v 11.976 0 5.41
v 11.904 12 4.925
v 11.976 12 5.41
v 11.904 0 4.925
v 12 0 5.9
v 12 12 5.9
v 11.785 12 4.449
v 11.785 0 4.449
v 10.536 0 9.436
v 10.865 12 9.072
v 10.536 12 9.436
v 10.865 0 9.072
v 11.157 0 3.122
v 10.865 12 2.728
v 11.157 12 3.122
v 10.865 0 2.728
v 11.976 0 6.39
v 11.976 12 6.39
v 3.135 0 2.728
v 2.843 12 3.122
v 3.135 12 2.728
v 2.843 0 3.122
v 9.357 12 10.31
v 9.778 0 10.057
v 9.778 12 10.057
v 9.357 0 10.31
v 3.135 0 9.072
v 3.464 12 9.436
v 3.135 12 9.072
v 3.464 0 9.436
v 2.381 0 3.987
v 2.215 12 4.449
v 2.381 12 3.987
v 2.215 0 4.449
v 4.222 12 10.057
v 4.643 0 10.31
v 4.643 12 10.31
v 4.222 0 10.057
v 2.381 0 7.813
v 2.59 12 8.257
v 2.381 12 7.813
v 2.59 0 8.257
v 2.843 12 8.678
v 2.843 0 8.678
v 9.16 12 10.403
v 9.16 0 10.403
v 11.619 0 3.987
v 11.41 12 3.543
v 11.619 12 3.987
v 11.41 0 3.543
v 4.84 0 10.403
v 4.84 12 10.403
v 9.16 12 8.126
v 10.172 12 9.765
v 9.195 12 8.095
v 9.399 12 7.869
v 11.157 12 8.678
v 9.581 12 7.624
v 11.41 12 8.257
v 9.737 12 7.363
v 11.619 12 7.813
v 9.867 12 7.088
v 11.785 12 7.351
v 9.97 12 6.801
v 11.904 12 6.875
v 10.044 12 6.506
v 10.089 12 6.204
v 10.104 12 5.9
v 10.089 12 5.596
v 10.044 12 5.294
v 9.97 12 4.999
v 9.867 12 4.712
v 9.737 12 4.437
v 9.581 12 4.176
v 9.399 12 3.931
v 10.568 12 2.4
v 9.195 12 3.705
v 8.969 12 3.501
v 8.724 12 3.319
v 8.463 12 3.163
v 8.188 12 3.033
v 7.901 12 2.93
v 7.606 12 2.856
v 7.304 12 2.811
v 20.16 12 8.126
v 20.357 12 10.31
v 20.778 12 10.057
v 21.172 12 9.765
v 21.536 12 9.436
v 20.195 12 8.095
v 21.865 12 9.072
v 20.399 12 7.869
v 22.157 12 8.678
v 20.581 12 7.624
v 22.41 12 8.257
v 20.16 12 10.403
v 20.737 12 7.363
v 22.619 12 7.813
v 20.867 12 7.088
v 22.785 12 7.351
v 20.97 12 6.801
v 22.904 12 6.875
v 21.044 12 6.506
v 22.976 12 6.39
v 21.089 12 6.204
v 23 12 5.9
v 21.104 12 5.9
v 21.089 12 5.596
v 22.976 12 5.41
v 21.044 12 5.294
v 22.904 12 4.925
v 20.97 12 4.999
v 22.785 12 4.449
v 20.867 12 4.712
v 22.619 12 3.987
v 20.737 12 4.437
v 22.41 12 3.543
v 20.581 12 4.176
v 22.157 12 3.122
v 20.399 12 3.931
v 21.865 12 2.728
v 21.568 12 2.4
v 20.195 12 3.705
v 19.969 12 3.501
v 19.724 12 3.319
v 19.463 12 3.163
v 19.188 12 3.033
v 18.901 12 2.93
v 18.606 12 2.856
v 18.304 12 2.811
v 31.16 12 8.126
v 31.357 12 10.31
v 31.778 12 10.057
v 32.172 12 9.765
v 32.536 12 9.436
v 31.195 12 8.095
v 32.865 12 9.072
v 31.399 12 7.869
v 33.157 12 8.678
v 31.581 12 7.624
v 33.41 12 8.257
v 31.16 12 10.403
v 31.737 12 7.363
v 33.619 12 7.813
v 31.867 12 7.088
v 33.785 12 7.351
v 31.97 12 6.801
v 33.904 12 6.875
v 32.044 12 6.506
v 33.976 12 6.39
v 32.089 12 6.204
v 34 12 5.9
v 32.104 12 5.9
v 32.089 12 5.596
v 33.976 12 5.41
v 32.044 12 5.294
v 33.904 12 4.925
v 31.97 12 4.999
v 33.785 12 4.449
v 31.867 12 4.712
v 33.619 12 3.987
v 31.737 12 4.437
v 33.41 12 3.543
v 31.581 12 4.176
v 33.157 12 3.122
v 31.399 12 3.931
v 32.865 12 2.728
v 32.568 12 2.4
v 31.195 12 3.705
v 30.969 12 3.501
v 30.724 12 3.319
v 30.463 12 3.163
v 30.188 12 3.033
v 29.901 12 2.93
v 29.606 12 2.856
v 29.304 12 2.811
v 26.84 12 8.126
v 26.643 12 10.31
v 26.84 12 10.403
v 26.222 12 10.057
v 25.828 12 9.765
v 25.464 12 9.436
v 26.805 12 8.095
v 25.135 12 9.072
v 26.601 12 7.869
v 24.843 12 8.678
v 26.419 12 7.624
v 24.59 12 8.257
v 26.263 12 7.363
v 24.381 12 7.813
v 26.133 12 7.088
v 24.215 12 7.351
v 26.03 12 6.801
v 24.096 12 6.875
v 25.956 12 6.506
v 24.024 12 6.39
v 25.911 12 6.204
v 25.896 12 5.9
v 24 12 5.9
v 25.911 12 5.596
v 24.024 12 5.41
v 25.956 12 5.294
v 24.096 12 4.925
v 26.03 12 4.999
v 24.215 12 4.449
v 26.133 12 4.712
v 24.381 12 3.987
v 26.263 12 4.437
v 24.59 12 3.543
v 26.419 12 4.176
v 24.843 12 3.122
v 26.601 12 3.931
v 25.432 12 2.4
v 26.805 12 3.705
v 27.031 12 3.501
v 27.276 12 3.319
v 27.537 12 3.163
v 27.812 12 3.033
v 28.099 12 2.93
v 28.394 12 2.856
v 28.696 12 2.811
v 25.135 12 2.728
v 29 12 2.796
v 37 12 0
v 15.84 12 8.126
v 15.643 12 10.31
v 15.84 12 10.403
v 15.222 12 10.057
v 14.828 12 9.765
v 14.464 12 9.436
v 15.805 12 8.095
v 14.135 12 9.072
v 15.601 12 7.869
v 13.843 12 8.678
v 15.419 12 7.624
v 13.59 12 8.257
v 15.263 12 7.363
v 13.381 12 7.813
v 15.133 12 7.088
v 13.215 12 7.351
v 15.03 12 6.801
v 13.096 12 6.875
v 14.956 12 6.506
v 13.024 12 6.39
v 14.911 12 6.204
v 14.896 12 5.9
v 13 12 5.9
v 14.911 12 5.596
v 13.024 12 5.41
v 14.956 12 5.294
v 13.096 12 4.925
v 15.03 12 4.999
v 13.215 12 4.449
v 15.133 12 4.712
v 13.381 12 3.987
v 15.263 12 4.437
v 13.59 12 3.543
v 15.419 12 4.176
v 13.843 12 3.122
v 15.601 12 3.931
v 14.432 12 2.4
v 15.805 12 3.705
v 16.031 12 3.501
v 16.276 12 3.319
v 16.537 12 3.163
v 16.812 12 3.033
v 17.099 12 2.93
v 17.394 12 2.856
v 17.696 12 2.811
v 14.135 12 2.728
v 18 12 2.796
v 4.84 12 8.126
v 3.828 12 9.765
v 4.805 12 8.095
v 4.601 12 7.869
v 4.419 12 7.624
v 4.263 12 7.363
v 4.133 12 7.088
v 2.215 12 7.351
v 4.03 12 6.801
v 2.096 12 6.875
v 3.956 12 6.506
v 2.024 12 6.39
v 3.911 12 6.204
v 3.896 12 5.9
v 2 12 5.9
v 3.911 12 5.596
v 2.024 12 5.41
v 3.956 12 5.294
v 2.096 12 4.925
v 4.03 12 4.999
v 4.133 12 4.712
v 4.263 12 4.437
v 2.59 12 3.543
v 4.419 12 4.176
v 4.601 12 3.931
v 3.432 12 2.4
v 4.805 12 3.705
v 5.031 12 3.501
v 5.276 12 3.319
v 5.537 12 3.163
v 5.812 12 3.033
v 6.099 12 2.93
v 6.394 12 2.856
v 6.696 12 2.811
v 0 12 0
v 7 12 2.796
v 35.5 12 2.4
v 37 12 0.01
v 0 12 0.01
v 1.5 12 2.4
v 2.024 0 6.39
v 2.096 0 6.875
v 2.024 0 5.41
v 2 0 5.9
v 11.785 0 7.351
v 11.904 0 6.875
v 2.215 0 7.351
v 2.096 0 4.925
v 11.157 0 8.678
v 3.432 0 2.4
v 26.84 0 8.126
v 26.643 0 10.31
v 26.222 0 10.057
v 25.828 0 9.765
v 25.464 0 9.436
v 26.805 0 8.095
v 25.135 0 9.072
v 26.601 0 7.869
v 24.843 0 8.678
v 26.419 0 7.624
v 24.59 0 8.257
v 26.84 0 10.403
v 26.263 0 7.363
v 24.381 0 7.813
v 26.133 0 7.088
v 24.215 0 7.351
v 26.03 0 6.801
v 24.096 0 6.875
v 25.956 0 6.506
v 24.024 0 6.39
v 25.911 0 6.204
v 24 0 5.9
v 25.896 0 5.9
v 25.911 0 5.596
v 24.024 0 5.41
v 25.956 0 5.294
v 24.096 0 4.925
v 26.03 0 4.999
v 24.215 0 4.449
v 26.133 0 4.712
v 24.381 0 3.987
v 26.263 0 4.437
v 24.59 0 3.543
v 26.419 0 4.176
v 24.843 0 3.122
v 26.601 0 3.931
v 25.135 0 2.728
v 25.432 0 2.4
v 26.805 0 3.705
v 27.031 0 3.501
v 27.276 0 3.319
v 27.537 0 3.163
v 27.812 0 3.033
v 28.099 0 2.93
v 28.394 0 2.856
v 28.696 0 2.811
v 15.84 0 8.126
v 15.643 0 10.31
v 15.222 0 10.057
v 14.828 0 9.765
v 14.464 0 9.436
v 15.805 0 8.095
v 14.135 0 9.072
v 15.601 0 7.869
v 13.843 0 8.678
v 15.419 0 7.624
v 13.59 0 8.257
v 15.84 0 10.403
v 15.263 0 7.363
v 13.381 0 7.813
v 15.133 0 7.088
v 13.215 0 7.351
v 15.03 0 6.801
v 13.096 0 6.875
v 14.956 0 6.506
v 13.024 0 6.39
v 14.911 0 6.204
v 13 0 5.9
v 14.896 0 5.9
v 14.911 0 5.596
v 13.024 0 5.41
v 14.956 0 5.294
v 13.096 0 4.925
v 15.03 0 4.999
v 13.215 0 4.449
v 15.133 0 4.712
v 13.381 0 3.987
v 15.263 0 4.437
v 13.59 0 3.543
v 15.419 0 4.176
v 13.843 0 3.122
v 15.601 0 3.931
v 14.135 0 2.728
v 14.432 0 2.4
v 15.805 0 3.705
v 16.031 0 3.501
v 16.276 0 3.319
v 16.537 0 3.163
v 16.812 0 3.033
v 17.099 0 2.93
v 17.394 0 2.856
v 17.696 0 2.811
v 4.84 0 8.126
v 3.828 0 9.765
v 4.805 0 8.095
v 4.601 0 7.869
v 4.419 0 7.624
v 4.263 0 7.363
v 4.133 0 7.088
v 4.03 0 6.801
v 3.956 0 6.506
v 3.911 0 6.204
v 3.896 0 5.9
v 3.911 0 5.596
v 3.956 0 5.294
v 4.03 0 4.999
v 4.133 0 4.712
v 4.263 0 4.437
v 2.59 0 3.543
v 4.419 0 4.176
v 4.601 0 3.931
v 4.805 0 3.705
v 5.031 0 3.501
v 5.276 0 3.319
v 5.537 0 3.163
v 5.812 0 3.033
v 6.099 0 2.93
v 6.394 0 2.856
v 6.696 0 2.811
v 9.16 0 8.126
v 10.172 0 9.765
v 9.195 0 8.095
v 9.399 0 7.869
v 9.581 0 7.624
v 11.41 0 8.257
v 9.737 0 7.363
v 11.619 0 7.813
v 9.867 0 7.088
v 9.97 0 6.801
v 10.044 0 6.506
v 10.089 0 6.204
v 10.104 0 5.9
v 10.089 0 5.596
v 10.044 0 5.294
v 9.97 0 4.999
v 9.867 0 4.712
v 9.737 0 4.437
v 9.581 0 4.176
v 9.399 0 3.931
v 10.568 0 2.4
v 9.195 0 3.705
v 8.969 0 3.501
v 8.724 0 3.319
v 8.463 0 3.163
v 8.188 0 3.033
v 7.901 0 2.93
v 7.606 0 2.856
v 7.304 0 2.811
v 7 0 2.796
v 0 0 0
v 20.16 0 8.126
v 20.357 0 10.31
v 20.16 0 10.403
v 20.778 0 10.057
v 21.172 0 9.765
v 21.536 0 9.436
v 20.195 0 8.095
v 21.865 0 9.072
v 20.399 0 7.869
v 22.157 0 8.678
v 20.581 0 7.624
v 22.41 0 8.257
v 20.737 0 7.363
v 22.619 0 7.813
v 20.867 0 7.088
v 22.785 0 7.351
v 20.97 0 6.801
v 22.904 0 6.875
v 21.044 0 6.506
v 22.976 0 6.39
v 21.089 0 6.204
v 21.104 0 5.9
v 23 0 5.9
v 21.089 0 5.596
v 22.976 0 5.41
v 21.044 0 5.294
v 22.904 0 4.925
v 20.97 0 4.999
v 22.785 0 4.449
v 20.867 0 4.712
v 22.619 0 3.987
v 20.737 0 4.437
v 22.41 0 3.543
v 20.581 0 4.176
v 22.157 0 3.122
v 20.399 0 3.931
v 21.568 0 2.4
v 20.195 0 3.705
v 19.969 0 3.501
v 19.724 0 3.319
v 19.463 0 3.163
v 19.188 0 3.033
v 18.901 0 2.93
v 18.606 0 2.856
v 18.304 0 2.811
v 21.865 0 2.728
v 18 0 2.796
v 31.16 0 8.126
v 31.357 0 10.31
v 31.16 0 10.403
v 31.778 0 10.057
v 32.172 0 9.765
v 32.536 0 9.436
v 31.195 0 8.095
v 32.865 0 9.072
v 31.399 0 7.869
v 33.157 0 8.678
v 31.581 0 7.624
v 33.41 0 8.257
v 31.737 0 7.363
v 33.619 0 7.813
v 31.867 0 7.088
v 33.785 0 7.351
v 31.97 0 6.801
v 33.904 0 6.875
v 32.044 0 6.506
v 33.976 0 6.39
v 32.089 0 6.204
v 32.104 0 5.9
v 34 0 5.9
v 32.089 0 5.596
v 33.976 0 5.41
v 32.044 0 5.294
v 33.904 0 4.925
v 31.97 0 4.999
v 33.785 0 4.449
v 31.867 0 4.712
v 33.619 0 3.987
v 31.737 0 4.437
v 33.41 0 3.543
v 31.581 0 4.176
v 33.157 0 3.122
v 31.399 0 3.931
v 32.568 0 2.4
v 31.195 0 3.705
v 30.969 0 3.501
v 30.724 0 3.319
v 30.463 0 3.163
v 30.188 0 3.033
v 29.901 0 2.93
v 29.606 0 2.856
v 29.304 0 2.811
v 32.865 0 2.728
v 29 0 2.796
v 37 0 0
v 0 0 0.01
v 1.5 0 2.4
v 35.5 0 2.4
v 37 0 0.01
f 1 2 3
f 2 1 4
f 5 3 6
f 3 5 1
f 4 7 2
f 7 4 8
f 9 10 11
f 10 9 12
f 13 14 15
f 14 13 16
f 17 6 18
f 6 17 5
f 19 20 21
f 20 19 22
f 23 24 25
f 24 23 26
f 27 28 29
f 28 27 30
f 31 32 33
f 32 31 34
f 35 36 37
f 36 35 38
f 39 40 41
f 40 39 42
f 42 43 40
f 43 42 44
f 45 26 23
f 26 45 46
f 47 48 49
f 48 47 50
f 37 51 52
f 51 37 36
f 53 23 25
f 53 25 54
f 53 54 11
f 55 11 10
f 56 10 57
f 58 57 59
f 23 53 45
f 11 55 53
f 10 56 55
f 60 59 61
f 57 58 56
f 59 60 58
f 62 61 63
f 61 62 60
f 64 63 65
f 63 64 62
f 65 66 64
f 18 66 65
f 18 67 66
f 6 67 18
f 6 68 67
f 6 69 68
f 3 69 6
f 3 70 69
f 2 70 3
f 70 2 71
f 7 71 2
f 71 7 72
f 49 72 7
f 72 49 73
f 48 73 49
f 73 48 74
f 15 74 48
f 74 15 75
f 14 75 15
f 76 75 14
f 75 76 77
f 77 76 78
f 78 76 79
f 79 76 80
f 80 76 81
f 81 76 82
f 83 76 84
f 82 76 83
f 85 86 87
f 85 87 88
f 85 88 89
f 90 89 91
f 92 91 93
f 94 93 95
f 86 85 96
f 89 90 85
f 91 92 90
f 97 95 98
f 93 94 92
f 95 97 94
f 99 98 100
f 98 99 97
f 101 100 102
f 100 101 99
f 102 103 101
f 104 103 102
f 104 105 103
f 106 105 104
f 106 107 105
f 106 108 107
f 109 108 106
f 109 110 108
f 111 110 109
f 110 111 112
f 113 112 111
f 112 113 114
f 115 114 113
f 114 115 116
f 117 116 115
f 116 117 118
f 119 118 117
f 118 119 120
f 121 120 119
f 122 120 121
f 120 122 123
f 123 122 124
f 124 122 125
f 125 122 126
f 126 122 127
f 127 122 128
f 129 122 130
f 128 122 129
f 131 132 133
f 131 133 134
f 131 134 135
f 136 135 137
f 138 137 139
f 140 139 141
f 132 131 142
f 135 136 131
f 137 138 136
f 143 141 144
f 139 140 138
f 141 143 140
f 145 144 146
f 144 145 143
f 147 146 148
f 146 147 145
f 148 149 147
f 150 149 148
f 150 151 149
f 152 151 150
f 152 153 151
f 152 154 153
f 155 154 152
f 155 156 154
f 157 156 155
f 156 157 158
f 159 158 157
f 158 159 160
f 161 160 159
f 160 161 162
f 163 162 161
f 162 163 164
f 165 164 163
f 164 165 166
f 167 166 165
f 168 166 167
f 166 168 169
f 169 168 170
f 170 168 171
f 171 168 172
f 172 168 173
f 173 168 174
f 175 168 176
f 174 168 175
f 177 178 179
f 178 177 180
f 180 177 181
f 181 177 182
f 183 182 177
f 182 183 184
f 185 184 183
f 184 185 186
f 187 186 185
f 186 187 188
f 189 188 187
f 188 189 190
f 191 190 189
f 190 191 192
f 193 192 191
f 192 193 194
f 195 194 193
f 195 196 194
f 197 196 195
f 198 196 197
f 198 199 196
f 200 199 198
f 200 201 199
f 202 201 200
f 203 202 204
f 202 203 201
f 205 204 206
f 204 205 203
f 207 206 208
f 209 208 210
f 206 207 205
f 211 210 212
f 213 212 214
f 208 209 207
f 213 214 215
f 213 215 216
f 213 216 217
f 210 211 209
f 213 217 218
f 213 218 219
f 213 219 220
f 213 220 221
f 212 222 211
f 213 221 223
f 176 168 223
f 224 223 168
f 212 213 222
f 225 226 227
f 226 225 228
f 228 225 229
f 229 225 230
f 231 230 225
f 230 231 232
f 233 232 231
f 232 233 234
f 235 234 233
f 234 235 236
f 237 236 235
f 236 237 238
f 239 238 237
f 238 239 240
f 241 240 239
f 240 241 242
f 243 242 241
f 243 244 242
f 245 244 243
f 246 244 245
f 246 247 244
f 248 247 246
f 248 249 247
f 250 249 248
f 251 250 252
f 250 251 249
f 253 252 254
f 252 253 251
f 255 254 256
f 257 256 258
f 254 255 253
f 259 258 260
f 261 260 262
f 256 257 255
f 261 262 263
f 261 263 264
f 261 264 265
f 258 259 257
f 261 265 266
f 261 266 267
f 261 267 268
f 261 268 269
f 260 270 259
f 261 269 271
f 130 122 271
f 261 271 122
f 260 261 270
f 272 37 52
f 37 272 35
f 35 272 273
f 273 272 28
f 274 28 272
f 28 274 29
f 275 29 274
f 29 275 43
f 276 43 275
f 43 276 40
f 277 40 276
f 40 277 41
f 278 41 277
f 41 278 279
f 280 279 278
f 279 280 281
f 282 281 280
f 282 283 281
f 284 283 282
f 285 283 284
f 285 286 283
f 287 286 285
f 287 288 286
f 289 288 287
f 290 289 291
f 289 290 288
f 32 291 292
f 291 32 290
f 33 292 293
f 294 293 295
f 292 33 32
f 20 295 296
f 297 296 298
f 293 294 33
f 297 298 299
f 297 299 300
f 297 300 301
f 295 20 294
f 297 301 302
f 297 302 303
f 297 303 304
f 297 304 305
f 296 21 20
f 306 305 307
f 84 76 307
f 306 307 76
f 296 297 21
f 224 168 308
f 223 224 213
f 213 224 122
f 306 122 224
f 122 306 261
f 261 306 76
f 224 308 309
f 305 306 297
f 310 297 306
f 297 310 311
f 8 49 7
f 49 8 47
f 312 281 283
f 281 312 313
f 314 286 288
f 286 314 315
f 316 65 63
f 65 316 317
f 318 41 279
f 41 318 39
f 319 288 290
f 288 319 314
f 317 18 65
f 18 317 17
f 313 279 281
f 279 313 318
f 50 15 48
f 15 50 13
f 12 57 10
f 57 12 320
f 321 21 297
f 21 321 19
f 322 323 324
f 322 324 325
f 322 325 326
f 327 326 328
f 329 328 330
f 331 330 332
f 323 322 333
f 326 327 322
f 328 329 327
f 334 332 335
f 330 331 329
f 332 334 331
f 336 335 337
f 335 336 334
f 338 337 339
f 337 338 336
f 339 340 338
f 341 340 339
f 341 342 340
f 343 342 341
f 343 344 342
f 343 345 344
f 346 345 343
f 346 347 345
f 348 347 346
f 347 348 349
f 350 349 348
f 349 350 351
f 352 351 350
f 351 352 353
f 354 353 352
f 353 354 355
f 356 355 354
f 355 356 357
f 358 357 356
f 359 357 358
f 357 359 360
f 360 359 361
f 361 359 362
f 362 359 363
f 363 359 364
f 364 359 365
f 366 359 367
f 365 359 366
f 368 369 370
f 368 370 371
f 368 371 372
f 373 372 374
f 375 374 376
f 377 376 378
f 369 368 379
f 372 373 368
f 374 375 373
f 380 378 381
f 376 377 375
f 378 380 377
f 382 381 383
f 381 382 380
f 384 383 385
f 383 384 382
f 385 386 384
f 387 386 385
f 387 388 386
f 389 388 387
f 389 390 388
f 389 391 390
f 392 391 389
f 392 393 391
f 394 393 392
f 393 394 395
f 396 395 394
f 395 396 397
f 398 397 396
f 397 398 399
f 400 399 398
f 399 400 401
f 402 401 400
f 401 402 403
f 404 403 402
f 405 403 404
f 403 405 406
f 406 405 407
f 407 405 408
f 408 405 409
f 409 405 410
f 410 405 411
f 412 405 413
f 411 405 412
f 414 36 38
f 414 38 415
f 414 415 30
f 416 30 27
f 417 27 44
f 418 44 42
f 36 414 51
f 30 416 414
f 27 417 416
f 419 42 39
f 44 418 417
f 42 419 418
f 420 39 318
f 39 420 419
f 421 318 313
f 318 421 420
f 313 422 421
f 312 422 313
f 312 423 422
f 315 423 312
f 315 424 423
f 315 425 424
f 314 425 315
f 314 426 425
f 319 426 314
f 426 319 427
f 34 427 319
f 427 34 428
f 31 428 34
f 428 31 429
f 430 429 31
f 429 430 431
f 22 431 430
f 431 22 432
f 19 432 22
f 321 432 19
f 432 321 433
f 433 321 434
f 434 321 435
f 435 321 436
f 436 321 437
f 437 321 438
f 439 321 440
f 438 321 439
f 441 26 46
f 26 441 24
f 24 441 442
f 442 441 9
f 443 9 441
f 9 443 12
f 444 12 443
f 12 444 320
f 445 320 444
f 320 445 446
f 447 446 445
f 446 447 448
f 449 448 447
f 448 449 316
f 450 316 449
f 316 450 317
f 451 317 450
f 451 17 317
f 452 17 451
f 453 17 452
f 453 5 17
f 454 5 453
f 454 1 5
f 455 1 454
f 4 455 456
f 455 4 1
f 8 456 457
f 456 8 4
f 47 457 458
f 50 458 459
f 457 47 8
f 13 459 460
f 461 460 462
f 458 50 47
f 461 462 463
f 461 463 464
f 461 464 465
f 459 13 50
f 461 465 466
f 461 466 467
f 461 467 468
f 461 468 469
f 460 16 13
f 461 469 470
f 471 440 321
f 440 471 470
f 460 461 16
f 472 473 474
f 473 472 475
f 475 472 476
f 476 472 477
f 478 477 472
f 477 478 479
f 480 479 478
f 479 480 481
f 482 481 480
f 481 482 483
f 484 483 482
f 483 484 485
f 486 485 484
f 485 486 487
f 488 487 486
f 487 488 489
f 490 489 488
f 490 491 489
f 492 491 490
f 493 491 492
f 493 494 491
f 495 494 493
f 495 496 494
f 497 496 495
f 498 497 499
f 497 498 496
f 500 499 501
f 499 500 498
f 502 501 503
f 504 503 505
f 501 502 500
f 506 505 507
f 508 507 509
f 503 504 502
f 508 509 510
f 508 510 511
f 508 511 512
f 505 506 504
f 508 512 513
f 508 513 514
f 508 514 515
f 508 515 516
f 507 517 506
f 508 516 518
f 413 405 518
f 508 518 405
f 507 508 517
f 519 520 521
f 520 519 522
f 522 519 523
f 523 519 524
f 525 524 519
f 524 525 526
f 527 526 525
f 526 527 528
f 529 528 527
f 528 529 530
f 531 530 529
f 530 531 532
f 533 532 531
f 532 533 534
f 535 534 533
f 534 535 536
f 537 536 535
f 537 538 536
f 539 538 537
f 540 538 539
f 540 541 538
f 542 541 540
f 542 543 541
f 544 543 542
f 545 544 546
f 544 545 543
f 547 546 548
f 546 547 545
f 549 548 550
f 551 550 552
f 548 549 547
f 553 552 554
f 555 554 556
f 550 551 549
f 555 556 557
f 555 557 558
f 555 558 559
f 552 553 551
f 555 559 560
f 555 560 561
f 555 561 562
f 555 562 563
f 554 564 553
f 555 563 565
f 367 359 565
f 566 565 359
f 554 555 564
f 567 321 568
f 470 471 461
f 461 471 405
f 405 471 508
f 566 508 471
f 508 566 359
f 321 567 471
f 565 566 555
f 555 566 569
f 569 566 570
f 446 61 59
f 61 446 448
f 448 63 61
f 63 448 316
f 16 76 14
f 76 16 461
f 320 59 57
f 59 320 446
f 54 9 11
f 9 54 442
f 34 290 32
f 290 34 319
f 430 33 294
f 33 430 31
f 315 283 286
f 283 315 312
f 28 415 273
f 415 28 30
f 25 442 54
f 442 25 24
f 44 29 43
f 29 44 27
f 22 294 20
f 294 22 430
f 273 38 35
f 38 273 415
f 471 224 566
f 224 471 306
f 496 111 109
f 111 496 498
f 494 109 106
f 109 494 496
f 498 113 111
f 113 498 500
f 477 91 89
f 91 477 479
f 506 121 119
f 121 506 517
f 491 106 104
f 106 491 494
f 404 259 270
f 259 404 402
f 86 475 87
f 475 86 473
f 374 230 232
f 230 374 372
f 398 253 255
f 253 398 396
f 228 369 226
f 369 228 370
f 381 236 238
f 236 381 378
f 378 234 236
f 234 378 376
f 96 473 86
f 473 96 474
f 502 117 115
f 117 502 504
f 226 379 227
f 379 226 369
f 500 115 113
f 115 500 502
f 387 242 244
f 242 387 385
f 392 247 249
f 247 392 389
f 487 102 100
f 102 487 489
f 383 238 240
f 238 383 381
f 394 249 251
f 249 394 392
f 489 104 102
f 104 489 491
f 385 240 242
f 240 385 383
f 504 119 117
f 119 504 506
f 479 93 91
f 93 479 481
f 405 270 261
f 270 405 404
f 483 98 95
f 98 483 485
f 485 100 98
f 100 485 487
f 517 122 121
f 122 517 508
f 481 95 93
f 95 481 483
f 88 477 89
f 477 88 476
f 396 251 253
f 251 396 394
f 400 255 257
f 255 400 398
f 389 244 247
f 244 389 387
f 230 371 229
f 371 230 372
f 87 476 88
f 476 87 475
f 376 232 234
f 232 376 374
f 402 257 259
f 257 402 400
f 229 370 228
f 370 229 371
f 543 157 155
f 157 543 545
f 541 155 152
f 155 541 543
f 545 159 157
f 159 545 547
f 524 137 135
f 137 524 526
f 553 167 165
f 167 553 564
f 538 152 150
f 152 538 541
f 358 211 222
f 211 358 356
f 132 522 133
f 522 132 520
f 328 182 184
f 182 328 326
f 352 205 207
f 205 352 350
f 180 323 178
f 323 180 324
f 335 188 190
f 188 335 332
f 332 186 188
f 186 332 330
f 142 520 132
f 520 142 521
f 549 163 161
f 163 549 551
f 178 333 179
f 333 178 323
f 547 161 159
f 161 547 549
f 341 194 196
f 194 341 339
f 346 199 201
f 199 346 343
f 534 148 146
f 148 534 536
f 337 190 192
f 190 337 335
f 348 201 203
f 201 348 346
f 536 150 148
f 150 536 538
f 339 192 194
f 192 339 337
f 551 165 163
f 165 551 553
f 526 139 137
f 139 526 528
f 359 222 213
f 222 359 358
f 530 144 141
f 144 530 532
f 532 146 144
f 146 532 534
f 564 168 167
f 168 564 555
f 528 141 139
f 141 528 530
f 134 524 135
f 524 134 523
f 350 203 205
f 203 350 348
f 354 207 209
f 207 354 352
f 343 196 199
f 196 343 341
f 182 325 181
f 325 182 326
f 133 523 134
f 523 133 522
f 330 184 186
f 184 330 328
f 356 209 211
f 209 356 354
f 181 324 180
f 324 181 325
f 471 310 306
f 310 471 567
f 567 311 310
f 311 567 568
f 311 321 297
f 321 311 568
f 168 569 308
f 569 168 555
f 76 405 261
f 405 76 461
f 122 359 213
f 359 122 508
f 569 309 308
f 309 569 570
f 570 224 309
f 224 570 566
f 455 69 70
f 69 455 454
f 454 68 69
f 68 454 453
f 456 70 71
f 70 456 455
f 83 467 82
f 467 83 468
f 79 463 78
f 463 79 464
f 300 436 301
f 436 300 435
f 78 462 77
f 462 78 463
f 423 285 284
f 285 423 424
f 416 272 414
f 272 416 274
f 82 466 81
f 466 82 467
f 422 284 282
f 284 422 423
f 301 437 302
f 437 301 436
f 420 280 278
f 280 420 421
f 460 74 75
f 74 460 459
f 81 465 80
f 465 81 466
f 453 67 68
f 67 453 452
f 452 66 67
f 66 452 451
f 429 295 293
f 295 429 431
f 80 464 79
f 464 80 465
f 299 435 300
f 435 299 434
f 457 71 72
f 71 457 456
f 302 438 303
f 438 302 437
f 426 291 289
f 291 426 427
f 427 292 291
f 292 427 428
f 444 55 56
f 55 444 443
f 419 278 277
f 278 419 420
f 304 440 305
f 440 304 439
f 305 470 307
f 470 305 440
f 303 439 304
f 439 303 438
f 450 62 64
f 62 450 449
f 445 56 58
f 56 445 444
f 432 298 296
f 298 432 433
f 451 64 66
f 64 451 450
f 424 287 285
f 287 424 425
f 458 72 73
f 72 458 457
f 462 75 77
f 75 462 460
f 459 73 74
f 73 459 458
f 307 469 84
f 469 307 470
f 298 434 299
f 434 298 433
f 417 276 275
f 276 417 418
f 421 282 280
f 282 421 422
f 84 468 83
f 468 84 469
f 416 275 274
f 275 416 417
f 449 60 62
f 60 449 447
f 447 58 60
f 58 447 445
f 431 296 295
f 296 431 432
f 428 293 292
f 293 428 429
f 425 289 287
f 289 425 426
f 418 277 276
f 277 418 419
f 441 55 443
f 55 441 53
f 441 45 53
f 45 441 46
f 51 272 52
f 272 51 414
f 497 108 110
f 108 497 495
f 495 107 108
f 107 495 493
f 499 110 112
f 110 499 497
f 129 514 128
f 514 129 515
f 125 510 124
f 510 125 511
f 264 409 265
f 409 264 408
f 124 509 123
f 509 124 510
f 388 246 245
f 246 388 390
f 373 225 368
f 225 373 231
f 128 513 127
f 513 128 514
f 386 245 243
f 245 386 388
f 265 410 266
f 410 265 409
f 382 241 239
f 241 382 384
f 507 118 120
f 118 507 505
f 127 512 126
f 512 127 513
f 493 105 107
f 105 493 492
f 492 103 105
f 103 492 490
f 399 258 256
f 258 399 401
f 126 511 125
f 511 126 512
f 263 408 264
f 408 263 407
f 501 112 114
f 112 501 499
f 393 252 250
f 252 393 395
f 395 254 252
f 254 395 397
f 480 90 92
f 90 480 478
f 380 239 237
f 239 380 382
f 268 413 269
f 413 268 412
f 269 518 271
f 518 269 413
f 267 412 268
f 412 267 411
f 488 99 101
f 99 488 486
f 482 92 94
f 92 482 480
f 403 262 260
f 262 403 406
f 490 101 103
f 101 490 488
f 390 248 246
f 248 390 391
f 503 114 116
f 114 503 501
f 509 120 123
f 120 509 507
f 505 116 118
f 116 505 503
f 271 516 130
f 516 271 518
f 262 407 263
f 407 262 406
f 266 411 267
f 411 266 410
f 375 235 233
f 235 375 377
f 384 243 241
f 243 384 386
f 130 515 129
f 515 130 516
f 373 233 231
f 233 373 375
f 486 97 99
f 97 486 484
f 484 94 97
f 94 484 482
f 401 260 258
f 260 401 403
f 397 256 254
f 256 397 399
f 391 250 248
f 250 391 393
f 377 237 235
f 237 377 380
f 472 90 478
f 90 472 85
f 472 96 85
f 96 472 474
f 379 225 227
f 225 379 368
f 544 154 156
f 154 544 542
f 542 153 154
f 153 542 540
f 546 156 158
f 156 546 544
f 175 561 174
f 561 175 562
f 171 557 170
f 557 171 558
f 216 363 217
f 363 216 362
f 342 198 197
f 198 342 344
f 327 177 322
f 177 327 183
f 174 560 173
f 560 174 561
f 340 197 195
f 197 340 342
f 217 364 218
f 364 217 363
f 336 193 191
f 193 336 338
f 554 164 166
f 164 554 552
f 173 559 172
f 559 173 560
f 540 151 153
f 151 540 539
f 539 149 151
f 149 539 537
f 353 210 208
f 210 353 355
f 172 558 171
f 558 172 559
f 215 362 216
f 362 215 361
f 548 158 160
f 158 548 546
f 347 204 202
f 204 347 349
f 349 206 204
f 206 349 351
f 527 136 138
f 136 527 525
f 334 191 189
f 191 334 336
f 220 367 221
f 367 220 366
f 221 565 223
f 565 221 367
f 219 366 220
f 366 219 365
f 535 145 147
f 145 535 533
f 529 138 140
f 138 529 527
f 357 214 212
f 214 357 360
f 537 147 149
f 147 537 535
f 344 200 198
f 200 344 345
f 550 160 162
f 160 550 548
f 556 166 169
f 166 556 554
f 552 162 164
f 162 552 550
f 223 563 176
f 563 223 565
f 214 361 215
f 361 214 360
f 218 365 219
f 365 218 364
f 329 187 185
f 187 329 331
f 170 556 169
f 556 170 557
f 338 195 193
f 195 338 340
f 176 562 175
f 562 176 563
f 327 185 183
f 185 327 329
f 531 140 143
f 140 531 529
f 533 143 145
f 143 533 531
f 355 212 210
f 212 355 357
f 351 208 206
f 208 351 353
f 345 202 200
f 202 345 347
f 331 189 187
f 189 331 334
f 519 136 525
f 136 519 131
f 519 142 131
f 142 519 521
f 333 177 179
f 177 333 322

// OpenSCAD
// Desk Cable Clip - original parametric design (Brian Sacco)
// Flat-backed clip for double-sided tape; snap-in slots hold cables.
slots        = 3;     // number of cable slots
cable_d      = 6.0;   // cable diameter (mm). Common: 3.5 phone cables, 4.5 braided USB-C, 6 laptop, 8 HDMI/monitor
fit          = 0.2;   // extra diameter so the cable can slide
opening      = 0.72;  // mouth width as fraction of cable_d (snap fit)
wall         = 2.0;
depth        = 12;    // clip length along the cable (mm)
base_t       = 2.4;   // base plate thickness (mm)
gap          = 3;     // spacing between slots
$fn = 64;

pitch = cable_d + 2*wall + gap - wall;
width = slots * pitch + wall + 2;
ring_h = base_t + cable_d/2 + 0.5; // cable centre height

module body() {
    // base plate with rounded ends
    hull() {
        translate([1.5,0,0]) cube([width-3, depth, base_t]);
        translate([0,0,0]) cube([width, depth, 0.01]);
    }
    for (i=[0:slots-1]) {
        x = wall + 1 + cable_d/2 + wall/2 + i*pitch;
        translate([x,0,ring_h]) rotate([-90,0,0])
            cylinder(d = cable_d + 2*wall, h = depth);
        // fill between ring and base so it prints without supports
        translate([x - (cable_d/2+wall)*0.7, 0, 0])
            cube([(cable_d/2+wall)*1.4, depth, ring_h]);
    }
}
difference() {
    body();
    for (i=[0:slots-1]) {
        x = wall + 1 + cable_d/2 + wall/2 + i*pitch;
        translate([x,-1,ring_h]) rotate([-90,0,0]) cylinder(d = (cable_d + fit) / cos(180/$fn), h = depth+2);
        // snap mouth on top
        translate([x - cable_d*opening/2, -1, ring_h]) cube([cable_d*opening, depth+2, cable_d/2 + wall + 1]);   // always cuts through the top of the ring
    }
}
